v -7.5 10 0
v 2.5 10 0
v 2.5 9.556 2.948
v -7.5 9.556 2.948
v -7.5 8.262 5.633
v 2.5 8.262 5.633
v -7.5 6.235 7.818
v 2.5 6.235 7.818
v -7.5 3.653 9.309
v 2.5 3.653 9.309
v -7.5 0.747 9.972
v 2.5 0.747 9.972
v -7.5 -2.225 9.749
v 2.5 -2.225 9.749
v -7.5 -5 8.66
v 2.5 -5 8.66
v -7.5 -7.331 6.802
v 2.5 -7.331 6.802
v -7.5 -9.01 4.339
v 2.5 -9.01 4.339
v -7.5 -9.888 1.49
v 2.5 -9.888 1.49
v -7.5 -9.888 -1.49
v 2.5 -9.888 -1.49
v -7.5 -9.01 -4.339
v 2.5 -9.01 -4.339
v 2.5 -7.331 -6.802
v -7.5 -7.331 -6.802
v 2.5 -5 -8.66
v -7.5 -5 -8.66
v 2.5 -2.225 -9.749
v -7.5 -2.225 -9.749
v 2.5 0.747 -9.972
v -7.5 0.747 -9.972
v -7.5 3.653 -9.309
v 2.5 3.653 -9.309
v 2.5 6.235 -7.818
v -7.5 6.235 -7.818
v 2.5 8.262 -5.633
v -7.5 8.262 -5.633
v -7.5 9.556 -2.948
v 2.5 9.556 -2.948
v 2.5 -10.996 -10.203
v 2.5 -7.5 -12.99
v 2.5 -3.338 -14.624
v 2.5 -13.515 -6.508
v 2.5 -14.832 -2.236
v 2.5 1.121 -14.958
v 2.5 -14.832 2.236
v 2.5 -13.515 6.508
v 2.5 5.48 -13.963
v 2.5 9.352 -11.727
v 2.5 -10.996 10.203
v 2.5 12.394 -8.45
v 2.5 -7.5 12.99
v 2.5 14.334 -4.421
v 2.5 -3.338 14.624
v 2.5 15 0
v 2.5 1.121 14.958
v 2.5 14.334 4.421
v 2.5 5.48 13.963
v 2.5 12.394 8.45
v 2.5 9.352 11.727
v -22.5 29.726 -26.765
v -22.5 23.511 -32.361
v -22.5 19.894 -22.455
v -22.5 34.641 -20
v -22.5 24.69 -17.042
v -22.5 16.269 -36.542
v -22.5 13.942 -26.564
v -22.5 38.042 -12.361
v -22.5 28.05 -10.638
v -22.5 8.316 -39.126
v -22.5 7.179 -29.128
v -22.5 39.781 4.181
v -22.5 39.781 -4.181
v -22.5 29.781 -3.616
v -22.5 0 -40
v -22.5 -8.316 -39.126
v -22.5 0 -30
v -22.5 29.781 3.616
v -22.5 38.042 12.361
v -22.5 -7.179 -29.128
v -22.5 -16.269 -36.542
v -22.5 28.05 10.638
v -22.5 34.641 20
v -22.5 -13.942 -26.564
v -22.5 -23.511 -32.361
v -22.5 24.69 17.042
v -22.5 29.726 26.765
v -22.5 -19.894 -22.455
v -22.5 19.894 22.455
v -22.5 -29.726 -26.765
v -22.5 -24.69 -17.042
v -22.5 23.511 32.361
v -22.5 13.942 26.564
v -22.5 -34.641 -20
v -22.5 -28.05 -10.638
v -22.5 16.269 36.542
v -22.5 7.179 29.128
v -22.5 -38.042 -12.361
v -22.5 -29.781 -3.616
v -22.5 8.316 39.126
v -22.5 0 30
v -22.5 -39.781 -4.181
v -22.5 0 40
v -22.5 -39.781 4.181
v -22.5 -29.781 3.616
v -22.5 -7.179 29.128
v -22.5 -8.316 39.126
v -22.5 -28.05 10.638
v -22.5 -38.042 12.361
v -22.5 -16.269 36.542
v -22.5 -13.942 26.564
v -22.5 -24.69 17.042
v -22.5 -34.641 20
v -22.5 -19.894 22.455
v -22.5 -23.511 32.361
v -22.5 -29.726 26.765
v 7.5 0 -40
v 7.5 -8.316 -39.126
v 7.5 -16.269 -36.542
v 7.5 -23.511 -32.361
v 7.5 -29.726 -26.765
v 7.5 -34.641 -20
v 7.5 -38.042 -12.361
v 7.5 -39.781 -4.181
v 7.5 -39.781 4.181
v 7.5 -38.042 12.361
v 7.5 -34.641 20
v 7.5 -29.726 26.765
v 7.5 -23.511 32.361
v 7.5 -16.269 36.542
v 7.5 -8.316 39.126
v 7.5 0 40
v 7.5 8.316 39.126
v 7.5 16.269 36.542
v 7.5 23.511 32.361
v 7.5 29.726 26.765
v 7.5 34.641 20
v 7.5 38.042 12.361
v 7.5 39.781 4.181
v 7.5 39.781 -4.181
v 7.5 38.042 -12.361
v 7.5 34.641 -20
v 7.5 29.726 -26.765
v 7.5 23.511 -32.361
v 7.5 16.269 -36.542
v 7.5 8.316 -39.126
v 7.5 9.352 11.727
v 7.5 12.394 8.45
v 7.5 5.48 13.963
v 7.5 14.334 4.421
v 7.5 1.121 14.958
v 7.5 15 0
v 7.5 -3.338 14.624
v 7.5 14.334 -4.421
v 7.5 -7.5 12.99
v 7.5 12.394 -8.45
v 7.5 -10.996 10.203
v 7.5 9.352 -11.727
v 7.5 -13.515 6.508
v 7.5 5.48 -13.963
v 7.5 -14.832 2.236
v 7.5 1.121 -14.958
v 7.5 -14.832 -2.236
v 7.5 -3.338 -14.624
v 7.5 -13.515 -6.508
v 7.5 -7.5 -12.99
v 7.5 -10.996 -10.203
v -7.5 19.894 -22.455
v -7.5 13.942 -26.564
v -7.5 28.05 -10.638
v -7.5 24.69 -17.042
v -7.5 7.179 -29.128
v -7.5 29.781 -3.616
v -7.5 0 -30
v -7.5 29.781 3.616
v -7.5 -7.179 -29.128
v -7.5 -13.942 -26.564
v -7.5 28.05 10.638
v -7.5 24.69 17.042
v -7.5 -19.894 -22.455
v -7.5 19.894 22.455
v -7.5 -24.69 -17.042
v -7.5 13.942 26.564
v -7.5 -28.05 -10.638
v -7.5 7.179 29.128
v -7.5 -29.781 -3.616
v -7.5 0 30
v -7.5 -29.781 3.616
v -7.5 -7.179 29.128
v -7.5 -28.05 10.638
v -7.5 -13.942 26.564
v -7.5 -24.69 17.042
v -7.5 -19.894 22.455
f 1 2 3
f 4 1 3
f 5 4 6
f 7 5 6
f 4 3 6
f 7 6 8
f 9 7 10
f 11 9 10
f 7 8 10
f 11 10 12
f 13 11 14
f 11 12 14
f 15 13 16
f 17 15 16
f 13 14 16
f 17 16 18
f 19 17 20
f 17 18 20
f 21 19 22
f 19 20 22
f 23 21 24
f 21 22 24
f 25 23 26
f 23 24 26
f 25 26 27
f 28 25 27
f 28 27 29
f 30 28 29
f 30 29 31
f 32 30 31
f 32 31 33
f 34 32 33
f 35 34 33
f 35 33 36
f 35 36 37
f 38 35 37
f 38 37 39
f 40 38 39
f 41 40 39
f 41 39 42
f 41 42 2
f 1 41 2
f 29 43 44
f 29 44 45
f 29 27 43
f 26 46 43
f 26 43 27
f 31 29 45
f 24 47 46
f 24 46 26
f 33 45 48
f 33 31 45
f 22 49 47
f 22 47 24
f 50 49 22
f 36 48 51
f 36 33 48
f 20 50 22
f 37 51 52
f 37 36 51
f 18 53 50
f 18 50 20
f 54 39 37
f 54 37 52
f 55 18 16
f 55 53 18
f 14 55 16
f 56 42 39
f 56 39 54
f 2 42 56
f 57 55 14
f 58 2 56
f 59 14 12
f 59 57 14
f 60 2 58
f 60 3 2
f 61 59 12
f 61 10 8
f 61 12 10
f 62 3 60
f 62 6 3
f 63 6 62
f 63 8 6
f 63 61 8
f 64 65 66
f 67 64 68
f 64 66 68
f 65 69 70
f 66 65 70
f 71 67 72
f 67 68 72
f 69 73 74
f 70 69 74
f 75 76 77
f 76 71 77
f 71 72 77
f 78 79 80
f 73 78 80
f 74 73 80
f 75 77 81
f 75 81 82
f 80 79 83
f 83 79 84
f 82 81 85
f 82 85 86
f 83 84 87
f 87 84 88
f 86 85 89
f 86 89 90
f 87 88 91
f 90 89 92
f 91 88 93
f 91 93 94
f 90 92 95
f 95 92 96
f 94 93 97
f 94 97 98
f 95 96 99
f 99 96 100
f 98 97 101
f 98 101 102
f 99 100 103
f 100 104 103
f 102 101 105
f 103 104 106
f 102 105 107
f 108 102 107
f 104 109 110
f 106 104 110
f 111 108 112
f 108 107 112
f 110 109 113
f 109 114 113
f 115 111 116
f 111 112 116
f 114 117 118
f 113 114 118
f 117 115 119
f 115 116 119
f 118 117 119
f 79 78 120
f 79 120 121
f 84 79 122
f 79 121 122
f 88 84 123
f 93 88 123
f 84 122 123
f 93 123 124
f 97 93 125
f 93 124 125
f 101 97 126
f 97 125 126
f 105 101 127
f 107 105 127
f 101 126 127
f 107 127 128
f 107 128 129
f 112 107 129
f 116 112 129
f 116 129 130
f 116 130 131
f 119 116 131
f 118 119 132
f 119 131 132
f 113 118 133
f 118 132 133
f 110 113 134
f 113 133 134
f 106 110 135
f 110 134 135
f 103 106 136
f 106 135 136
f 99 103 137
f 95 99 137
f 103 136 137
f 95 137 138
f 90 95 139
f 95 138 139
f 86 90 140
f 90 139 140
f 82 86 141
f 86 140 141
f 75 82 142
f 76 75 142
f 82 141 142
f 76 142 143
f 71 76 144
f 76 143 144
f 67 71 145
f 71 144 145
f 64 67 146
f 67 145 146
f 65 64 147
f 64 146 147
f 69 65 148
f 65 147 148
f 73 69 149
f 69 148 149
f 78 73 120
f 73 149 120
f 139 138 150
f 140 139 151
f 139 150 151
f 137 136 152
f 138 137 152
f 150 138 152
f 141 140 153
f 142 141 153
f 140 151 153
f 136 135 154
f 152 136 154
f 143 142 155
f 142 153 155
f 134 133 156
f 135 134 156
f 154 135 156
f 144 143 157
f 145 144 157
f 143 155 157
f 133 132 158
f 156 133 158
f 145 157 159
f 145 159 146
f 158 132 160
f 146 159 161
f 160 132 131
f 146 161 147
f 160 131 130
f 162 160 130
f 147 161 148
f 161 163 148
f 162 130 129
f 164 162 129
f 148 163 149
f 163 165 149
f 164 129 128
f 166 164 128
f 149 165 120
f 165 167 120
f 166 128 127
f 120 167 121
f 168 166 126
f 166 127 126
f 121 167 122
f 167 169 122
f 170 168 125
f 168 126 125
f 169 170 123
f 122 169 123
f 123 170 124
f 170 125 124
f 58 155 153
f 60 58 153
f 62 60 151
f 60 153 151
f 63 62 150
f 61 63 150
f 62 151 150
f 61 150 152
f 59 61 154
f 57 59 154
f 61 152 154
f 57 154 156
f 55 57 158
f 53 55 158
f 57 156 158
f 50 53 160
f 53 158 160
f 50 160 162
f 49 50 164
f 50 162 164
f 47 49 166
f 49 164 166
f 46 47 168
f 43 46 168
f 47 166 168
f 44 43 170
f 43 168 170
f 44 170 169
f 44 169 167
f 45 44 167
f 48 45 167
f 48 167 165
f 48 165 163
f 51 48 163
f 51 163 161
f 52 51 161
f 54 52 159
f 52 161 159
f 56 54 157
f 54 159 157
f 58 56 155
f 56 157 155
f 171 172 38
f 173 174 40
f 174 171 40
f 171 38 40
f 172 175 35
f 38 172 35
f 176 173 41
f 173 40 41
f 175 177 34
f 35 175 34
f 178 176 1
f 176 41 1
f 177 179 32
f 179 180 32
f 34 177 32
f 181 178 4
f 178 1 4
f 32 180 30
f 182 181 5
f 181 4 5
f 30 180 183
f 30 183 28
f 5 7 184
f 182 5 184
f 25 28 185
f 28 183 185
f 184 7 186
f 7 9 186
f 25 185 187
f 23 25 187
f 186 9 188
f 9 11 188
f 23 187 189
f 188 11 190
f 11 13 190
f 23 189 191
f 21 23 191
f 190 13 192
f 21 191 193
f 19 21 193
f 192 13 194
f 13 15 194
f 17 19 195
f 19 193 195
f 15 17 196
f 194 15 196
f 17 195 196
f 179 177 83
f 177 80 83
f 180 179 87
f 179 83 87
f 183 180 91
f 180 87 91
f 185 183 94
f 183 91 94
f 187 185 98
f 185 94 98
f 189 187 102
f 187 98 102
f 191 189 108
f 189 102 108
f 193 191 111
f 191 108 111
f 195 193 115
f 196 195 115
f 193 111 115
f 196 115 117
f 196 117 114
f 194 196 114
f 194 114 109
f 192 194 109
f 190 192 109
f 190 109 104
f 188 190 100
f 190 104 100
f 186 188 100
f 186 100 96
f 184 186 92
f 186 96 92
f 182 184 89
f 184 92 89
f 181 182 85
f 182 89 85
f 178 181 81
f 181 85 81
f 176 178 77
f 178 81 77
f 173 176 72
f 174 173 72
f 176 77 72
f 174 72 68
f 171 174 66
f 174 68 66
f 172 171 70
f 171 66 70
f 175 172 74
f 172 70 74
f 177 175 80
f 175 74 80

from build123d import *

# Parameters (mm, degrees)
F2_R     = 10
F3_DEPTH = 25
F2_R_2   = 15
F4_DEPTH = 5


with BuildPart() as f1:
    # F0 (on Front) → F1 (revolve)
    with BuildSketch(Plane.XZ):
        Polygon((7.5, 0), (-7.5, 0), (-7.5, -30), (-22.5, -30), (-22.5, -40), (7.5, -40), align=None)
    revolve(axis=Axis((0, 0, 0), (-1, 0, 0)))

    # F2 (on face) → F3 (cut)
    with BuildSketch(Plane.YZ.offset(7.5)):
        Circle(F2_R)
    extrude(amount=-F3_DEPTH, mode=Mode.SUBTRACT)

    # F2 (on face) → F4 (cut)
    with BuildSketch(Plane.YZ.offset(7.5)):
        Circle(F2_R_2)
        Circle(F2_R, mode=Mode.SUBTRACT)
    extrude(amount=-F4_DEPTH, mode=Mode.SUBTRACT)


solid = f1.part
